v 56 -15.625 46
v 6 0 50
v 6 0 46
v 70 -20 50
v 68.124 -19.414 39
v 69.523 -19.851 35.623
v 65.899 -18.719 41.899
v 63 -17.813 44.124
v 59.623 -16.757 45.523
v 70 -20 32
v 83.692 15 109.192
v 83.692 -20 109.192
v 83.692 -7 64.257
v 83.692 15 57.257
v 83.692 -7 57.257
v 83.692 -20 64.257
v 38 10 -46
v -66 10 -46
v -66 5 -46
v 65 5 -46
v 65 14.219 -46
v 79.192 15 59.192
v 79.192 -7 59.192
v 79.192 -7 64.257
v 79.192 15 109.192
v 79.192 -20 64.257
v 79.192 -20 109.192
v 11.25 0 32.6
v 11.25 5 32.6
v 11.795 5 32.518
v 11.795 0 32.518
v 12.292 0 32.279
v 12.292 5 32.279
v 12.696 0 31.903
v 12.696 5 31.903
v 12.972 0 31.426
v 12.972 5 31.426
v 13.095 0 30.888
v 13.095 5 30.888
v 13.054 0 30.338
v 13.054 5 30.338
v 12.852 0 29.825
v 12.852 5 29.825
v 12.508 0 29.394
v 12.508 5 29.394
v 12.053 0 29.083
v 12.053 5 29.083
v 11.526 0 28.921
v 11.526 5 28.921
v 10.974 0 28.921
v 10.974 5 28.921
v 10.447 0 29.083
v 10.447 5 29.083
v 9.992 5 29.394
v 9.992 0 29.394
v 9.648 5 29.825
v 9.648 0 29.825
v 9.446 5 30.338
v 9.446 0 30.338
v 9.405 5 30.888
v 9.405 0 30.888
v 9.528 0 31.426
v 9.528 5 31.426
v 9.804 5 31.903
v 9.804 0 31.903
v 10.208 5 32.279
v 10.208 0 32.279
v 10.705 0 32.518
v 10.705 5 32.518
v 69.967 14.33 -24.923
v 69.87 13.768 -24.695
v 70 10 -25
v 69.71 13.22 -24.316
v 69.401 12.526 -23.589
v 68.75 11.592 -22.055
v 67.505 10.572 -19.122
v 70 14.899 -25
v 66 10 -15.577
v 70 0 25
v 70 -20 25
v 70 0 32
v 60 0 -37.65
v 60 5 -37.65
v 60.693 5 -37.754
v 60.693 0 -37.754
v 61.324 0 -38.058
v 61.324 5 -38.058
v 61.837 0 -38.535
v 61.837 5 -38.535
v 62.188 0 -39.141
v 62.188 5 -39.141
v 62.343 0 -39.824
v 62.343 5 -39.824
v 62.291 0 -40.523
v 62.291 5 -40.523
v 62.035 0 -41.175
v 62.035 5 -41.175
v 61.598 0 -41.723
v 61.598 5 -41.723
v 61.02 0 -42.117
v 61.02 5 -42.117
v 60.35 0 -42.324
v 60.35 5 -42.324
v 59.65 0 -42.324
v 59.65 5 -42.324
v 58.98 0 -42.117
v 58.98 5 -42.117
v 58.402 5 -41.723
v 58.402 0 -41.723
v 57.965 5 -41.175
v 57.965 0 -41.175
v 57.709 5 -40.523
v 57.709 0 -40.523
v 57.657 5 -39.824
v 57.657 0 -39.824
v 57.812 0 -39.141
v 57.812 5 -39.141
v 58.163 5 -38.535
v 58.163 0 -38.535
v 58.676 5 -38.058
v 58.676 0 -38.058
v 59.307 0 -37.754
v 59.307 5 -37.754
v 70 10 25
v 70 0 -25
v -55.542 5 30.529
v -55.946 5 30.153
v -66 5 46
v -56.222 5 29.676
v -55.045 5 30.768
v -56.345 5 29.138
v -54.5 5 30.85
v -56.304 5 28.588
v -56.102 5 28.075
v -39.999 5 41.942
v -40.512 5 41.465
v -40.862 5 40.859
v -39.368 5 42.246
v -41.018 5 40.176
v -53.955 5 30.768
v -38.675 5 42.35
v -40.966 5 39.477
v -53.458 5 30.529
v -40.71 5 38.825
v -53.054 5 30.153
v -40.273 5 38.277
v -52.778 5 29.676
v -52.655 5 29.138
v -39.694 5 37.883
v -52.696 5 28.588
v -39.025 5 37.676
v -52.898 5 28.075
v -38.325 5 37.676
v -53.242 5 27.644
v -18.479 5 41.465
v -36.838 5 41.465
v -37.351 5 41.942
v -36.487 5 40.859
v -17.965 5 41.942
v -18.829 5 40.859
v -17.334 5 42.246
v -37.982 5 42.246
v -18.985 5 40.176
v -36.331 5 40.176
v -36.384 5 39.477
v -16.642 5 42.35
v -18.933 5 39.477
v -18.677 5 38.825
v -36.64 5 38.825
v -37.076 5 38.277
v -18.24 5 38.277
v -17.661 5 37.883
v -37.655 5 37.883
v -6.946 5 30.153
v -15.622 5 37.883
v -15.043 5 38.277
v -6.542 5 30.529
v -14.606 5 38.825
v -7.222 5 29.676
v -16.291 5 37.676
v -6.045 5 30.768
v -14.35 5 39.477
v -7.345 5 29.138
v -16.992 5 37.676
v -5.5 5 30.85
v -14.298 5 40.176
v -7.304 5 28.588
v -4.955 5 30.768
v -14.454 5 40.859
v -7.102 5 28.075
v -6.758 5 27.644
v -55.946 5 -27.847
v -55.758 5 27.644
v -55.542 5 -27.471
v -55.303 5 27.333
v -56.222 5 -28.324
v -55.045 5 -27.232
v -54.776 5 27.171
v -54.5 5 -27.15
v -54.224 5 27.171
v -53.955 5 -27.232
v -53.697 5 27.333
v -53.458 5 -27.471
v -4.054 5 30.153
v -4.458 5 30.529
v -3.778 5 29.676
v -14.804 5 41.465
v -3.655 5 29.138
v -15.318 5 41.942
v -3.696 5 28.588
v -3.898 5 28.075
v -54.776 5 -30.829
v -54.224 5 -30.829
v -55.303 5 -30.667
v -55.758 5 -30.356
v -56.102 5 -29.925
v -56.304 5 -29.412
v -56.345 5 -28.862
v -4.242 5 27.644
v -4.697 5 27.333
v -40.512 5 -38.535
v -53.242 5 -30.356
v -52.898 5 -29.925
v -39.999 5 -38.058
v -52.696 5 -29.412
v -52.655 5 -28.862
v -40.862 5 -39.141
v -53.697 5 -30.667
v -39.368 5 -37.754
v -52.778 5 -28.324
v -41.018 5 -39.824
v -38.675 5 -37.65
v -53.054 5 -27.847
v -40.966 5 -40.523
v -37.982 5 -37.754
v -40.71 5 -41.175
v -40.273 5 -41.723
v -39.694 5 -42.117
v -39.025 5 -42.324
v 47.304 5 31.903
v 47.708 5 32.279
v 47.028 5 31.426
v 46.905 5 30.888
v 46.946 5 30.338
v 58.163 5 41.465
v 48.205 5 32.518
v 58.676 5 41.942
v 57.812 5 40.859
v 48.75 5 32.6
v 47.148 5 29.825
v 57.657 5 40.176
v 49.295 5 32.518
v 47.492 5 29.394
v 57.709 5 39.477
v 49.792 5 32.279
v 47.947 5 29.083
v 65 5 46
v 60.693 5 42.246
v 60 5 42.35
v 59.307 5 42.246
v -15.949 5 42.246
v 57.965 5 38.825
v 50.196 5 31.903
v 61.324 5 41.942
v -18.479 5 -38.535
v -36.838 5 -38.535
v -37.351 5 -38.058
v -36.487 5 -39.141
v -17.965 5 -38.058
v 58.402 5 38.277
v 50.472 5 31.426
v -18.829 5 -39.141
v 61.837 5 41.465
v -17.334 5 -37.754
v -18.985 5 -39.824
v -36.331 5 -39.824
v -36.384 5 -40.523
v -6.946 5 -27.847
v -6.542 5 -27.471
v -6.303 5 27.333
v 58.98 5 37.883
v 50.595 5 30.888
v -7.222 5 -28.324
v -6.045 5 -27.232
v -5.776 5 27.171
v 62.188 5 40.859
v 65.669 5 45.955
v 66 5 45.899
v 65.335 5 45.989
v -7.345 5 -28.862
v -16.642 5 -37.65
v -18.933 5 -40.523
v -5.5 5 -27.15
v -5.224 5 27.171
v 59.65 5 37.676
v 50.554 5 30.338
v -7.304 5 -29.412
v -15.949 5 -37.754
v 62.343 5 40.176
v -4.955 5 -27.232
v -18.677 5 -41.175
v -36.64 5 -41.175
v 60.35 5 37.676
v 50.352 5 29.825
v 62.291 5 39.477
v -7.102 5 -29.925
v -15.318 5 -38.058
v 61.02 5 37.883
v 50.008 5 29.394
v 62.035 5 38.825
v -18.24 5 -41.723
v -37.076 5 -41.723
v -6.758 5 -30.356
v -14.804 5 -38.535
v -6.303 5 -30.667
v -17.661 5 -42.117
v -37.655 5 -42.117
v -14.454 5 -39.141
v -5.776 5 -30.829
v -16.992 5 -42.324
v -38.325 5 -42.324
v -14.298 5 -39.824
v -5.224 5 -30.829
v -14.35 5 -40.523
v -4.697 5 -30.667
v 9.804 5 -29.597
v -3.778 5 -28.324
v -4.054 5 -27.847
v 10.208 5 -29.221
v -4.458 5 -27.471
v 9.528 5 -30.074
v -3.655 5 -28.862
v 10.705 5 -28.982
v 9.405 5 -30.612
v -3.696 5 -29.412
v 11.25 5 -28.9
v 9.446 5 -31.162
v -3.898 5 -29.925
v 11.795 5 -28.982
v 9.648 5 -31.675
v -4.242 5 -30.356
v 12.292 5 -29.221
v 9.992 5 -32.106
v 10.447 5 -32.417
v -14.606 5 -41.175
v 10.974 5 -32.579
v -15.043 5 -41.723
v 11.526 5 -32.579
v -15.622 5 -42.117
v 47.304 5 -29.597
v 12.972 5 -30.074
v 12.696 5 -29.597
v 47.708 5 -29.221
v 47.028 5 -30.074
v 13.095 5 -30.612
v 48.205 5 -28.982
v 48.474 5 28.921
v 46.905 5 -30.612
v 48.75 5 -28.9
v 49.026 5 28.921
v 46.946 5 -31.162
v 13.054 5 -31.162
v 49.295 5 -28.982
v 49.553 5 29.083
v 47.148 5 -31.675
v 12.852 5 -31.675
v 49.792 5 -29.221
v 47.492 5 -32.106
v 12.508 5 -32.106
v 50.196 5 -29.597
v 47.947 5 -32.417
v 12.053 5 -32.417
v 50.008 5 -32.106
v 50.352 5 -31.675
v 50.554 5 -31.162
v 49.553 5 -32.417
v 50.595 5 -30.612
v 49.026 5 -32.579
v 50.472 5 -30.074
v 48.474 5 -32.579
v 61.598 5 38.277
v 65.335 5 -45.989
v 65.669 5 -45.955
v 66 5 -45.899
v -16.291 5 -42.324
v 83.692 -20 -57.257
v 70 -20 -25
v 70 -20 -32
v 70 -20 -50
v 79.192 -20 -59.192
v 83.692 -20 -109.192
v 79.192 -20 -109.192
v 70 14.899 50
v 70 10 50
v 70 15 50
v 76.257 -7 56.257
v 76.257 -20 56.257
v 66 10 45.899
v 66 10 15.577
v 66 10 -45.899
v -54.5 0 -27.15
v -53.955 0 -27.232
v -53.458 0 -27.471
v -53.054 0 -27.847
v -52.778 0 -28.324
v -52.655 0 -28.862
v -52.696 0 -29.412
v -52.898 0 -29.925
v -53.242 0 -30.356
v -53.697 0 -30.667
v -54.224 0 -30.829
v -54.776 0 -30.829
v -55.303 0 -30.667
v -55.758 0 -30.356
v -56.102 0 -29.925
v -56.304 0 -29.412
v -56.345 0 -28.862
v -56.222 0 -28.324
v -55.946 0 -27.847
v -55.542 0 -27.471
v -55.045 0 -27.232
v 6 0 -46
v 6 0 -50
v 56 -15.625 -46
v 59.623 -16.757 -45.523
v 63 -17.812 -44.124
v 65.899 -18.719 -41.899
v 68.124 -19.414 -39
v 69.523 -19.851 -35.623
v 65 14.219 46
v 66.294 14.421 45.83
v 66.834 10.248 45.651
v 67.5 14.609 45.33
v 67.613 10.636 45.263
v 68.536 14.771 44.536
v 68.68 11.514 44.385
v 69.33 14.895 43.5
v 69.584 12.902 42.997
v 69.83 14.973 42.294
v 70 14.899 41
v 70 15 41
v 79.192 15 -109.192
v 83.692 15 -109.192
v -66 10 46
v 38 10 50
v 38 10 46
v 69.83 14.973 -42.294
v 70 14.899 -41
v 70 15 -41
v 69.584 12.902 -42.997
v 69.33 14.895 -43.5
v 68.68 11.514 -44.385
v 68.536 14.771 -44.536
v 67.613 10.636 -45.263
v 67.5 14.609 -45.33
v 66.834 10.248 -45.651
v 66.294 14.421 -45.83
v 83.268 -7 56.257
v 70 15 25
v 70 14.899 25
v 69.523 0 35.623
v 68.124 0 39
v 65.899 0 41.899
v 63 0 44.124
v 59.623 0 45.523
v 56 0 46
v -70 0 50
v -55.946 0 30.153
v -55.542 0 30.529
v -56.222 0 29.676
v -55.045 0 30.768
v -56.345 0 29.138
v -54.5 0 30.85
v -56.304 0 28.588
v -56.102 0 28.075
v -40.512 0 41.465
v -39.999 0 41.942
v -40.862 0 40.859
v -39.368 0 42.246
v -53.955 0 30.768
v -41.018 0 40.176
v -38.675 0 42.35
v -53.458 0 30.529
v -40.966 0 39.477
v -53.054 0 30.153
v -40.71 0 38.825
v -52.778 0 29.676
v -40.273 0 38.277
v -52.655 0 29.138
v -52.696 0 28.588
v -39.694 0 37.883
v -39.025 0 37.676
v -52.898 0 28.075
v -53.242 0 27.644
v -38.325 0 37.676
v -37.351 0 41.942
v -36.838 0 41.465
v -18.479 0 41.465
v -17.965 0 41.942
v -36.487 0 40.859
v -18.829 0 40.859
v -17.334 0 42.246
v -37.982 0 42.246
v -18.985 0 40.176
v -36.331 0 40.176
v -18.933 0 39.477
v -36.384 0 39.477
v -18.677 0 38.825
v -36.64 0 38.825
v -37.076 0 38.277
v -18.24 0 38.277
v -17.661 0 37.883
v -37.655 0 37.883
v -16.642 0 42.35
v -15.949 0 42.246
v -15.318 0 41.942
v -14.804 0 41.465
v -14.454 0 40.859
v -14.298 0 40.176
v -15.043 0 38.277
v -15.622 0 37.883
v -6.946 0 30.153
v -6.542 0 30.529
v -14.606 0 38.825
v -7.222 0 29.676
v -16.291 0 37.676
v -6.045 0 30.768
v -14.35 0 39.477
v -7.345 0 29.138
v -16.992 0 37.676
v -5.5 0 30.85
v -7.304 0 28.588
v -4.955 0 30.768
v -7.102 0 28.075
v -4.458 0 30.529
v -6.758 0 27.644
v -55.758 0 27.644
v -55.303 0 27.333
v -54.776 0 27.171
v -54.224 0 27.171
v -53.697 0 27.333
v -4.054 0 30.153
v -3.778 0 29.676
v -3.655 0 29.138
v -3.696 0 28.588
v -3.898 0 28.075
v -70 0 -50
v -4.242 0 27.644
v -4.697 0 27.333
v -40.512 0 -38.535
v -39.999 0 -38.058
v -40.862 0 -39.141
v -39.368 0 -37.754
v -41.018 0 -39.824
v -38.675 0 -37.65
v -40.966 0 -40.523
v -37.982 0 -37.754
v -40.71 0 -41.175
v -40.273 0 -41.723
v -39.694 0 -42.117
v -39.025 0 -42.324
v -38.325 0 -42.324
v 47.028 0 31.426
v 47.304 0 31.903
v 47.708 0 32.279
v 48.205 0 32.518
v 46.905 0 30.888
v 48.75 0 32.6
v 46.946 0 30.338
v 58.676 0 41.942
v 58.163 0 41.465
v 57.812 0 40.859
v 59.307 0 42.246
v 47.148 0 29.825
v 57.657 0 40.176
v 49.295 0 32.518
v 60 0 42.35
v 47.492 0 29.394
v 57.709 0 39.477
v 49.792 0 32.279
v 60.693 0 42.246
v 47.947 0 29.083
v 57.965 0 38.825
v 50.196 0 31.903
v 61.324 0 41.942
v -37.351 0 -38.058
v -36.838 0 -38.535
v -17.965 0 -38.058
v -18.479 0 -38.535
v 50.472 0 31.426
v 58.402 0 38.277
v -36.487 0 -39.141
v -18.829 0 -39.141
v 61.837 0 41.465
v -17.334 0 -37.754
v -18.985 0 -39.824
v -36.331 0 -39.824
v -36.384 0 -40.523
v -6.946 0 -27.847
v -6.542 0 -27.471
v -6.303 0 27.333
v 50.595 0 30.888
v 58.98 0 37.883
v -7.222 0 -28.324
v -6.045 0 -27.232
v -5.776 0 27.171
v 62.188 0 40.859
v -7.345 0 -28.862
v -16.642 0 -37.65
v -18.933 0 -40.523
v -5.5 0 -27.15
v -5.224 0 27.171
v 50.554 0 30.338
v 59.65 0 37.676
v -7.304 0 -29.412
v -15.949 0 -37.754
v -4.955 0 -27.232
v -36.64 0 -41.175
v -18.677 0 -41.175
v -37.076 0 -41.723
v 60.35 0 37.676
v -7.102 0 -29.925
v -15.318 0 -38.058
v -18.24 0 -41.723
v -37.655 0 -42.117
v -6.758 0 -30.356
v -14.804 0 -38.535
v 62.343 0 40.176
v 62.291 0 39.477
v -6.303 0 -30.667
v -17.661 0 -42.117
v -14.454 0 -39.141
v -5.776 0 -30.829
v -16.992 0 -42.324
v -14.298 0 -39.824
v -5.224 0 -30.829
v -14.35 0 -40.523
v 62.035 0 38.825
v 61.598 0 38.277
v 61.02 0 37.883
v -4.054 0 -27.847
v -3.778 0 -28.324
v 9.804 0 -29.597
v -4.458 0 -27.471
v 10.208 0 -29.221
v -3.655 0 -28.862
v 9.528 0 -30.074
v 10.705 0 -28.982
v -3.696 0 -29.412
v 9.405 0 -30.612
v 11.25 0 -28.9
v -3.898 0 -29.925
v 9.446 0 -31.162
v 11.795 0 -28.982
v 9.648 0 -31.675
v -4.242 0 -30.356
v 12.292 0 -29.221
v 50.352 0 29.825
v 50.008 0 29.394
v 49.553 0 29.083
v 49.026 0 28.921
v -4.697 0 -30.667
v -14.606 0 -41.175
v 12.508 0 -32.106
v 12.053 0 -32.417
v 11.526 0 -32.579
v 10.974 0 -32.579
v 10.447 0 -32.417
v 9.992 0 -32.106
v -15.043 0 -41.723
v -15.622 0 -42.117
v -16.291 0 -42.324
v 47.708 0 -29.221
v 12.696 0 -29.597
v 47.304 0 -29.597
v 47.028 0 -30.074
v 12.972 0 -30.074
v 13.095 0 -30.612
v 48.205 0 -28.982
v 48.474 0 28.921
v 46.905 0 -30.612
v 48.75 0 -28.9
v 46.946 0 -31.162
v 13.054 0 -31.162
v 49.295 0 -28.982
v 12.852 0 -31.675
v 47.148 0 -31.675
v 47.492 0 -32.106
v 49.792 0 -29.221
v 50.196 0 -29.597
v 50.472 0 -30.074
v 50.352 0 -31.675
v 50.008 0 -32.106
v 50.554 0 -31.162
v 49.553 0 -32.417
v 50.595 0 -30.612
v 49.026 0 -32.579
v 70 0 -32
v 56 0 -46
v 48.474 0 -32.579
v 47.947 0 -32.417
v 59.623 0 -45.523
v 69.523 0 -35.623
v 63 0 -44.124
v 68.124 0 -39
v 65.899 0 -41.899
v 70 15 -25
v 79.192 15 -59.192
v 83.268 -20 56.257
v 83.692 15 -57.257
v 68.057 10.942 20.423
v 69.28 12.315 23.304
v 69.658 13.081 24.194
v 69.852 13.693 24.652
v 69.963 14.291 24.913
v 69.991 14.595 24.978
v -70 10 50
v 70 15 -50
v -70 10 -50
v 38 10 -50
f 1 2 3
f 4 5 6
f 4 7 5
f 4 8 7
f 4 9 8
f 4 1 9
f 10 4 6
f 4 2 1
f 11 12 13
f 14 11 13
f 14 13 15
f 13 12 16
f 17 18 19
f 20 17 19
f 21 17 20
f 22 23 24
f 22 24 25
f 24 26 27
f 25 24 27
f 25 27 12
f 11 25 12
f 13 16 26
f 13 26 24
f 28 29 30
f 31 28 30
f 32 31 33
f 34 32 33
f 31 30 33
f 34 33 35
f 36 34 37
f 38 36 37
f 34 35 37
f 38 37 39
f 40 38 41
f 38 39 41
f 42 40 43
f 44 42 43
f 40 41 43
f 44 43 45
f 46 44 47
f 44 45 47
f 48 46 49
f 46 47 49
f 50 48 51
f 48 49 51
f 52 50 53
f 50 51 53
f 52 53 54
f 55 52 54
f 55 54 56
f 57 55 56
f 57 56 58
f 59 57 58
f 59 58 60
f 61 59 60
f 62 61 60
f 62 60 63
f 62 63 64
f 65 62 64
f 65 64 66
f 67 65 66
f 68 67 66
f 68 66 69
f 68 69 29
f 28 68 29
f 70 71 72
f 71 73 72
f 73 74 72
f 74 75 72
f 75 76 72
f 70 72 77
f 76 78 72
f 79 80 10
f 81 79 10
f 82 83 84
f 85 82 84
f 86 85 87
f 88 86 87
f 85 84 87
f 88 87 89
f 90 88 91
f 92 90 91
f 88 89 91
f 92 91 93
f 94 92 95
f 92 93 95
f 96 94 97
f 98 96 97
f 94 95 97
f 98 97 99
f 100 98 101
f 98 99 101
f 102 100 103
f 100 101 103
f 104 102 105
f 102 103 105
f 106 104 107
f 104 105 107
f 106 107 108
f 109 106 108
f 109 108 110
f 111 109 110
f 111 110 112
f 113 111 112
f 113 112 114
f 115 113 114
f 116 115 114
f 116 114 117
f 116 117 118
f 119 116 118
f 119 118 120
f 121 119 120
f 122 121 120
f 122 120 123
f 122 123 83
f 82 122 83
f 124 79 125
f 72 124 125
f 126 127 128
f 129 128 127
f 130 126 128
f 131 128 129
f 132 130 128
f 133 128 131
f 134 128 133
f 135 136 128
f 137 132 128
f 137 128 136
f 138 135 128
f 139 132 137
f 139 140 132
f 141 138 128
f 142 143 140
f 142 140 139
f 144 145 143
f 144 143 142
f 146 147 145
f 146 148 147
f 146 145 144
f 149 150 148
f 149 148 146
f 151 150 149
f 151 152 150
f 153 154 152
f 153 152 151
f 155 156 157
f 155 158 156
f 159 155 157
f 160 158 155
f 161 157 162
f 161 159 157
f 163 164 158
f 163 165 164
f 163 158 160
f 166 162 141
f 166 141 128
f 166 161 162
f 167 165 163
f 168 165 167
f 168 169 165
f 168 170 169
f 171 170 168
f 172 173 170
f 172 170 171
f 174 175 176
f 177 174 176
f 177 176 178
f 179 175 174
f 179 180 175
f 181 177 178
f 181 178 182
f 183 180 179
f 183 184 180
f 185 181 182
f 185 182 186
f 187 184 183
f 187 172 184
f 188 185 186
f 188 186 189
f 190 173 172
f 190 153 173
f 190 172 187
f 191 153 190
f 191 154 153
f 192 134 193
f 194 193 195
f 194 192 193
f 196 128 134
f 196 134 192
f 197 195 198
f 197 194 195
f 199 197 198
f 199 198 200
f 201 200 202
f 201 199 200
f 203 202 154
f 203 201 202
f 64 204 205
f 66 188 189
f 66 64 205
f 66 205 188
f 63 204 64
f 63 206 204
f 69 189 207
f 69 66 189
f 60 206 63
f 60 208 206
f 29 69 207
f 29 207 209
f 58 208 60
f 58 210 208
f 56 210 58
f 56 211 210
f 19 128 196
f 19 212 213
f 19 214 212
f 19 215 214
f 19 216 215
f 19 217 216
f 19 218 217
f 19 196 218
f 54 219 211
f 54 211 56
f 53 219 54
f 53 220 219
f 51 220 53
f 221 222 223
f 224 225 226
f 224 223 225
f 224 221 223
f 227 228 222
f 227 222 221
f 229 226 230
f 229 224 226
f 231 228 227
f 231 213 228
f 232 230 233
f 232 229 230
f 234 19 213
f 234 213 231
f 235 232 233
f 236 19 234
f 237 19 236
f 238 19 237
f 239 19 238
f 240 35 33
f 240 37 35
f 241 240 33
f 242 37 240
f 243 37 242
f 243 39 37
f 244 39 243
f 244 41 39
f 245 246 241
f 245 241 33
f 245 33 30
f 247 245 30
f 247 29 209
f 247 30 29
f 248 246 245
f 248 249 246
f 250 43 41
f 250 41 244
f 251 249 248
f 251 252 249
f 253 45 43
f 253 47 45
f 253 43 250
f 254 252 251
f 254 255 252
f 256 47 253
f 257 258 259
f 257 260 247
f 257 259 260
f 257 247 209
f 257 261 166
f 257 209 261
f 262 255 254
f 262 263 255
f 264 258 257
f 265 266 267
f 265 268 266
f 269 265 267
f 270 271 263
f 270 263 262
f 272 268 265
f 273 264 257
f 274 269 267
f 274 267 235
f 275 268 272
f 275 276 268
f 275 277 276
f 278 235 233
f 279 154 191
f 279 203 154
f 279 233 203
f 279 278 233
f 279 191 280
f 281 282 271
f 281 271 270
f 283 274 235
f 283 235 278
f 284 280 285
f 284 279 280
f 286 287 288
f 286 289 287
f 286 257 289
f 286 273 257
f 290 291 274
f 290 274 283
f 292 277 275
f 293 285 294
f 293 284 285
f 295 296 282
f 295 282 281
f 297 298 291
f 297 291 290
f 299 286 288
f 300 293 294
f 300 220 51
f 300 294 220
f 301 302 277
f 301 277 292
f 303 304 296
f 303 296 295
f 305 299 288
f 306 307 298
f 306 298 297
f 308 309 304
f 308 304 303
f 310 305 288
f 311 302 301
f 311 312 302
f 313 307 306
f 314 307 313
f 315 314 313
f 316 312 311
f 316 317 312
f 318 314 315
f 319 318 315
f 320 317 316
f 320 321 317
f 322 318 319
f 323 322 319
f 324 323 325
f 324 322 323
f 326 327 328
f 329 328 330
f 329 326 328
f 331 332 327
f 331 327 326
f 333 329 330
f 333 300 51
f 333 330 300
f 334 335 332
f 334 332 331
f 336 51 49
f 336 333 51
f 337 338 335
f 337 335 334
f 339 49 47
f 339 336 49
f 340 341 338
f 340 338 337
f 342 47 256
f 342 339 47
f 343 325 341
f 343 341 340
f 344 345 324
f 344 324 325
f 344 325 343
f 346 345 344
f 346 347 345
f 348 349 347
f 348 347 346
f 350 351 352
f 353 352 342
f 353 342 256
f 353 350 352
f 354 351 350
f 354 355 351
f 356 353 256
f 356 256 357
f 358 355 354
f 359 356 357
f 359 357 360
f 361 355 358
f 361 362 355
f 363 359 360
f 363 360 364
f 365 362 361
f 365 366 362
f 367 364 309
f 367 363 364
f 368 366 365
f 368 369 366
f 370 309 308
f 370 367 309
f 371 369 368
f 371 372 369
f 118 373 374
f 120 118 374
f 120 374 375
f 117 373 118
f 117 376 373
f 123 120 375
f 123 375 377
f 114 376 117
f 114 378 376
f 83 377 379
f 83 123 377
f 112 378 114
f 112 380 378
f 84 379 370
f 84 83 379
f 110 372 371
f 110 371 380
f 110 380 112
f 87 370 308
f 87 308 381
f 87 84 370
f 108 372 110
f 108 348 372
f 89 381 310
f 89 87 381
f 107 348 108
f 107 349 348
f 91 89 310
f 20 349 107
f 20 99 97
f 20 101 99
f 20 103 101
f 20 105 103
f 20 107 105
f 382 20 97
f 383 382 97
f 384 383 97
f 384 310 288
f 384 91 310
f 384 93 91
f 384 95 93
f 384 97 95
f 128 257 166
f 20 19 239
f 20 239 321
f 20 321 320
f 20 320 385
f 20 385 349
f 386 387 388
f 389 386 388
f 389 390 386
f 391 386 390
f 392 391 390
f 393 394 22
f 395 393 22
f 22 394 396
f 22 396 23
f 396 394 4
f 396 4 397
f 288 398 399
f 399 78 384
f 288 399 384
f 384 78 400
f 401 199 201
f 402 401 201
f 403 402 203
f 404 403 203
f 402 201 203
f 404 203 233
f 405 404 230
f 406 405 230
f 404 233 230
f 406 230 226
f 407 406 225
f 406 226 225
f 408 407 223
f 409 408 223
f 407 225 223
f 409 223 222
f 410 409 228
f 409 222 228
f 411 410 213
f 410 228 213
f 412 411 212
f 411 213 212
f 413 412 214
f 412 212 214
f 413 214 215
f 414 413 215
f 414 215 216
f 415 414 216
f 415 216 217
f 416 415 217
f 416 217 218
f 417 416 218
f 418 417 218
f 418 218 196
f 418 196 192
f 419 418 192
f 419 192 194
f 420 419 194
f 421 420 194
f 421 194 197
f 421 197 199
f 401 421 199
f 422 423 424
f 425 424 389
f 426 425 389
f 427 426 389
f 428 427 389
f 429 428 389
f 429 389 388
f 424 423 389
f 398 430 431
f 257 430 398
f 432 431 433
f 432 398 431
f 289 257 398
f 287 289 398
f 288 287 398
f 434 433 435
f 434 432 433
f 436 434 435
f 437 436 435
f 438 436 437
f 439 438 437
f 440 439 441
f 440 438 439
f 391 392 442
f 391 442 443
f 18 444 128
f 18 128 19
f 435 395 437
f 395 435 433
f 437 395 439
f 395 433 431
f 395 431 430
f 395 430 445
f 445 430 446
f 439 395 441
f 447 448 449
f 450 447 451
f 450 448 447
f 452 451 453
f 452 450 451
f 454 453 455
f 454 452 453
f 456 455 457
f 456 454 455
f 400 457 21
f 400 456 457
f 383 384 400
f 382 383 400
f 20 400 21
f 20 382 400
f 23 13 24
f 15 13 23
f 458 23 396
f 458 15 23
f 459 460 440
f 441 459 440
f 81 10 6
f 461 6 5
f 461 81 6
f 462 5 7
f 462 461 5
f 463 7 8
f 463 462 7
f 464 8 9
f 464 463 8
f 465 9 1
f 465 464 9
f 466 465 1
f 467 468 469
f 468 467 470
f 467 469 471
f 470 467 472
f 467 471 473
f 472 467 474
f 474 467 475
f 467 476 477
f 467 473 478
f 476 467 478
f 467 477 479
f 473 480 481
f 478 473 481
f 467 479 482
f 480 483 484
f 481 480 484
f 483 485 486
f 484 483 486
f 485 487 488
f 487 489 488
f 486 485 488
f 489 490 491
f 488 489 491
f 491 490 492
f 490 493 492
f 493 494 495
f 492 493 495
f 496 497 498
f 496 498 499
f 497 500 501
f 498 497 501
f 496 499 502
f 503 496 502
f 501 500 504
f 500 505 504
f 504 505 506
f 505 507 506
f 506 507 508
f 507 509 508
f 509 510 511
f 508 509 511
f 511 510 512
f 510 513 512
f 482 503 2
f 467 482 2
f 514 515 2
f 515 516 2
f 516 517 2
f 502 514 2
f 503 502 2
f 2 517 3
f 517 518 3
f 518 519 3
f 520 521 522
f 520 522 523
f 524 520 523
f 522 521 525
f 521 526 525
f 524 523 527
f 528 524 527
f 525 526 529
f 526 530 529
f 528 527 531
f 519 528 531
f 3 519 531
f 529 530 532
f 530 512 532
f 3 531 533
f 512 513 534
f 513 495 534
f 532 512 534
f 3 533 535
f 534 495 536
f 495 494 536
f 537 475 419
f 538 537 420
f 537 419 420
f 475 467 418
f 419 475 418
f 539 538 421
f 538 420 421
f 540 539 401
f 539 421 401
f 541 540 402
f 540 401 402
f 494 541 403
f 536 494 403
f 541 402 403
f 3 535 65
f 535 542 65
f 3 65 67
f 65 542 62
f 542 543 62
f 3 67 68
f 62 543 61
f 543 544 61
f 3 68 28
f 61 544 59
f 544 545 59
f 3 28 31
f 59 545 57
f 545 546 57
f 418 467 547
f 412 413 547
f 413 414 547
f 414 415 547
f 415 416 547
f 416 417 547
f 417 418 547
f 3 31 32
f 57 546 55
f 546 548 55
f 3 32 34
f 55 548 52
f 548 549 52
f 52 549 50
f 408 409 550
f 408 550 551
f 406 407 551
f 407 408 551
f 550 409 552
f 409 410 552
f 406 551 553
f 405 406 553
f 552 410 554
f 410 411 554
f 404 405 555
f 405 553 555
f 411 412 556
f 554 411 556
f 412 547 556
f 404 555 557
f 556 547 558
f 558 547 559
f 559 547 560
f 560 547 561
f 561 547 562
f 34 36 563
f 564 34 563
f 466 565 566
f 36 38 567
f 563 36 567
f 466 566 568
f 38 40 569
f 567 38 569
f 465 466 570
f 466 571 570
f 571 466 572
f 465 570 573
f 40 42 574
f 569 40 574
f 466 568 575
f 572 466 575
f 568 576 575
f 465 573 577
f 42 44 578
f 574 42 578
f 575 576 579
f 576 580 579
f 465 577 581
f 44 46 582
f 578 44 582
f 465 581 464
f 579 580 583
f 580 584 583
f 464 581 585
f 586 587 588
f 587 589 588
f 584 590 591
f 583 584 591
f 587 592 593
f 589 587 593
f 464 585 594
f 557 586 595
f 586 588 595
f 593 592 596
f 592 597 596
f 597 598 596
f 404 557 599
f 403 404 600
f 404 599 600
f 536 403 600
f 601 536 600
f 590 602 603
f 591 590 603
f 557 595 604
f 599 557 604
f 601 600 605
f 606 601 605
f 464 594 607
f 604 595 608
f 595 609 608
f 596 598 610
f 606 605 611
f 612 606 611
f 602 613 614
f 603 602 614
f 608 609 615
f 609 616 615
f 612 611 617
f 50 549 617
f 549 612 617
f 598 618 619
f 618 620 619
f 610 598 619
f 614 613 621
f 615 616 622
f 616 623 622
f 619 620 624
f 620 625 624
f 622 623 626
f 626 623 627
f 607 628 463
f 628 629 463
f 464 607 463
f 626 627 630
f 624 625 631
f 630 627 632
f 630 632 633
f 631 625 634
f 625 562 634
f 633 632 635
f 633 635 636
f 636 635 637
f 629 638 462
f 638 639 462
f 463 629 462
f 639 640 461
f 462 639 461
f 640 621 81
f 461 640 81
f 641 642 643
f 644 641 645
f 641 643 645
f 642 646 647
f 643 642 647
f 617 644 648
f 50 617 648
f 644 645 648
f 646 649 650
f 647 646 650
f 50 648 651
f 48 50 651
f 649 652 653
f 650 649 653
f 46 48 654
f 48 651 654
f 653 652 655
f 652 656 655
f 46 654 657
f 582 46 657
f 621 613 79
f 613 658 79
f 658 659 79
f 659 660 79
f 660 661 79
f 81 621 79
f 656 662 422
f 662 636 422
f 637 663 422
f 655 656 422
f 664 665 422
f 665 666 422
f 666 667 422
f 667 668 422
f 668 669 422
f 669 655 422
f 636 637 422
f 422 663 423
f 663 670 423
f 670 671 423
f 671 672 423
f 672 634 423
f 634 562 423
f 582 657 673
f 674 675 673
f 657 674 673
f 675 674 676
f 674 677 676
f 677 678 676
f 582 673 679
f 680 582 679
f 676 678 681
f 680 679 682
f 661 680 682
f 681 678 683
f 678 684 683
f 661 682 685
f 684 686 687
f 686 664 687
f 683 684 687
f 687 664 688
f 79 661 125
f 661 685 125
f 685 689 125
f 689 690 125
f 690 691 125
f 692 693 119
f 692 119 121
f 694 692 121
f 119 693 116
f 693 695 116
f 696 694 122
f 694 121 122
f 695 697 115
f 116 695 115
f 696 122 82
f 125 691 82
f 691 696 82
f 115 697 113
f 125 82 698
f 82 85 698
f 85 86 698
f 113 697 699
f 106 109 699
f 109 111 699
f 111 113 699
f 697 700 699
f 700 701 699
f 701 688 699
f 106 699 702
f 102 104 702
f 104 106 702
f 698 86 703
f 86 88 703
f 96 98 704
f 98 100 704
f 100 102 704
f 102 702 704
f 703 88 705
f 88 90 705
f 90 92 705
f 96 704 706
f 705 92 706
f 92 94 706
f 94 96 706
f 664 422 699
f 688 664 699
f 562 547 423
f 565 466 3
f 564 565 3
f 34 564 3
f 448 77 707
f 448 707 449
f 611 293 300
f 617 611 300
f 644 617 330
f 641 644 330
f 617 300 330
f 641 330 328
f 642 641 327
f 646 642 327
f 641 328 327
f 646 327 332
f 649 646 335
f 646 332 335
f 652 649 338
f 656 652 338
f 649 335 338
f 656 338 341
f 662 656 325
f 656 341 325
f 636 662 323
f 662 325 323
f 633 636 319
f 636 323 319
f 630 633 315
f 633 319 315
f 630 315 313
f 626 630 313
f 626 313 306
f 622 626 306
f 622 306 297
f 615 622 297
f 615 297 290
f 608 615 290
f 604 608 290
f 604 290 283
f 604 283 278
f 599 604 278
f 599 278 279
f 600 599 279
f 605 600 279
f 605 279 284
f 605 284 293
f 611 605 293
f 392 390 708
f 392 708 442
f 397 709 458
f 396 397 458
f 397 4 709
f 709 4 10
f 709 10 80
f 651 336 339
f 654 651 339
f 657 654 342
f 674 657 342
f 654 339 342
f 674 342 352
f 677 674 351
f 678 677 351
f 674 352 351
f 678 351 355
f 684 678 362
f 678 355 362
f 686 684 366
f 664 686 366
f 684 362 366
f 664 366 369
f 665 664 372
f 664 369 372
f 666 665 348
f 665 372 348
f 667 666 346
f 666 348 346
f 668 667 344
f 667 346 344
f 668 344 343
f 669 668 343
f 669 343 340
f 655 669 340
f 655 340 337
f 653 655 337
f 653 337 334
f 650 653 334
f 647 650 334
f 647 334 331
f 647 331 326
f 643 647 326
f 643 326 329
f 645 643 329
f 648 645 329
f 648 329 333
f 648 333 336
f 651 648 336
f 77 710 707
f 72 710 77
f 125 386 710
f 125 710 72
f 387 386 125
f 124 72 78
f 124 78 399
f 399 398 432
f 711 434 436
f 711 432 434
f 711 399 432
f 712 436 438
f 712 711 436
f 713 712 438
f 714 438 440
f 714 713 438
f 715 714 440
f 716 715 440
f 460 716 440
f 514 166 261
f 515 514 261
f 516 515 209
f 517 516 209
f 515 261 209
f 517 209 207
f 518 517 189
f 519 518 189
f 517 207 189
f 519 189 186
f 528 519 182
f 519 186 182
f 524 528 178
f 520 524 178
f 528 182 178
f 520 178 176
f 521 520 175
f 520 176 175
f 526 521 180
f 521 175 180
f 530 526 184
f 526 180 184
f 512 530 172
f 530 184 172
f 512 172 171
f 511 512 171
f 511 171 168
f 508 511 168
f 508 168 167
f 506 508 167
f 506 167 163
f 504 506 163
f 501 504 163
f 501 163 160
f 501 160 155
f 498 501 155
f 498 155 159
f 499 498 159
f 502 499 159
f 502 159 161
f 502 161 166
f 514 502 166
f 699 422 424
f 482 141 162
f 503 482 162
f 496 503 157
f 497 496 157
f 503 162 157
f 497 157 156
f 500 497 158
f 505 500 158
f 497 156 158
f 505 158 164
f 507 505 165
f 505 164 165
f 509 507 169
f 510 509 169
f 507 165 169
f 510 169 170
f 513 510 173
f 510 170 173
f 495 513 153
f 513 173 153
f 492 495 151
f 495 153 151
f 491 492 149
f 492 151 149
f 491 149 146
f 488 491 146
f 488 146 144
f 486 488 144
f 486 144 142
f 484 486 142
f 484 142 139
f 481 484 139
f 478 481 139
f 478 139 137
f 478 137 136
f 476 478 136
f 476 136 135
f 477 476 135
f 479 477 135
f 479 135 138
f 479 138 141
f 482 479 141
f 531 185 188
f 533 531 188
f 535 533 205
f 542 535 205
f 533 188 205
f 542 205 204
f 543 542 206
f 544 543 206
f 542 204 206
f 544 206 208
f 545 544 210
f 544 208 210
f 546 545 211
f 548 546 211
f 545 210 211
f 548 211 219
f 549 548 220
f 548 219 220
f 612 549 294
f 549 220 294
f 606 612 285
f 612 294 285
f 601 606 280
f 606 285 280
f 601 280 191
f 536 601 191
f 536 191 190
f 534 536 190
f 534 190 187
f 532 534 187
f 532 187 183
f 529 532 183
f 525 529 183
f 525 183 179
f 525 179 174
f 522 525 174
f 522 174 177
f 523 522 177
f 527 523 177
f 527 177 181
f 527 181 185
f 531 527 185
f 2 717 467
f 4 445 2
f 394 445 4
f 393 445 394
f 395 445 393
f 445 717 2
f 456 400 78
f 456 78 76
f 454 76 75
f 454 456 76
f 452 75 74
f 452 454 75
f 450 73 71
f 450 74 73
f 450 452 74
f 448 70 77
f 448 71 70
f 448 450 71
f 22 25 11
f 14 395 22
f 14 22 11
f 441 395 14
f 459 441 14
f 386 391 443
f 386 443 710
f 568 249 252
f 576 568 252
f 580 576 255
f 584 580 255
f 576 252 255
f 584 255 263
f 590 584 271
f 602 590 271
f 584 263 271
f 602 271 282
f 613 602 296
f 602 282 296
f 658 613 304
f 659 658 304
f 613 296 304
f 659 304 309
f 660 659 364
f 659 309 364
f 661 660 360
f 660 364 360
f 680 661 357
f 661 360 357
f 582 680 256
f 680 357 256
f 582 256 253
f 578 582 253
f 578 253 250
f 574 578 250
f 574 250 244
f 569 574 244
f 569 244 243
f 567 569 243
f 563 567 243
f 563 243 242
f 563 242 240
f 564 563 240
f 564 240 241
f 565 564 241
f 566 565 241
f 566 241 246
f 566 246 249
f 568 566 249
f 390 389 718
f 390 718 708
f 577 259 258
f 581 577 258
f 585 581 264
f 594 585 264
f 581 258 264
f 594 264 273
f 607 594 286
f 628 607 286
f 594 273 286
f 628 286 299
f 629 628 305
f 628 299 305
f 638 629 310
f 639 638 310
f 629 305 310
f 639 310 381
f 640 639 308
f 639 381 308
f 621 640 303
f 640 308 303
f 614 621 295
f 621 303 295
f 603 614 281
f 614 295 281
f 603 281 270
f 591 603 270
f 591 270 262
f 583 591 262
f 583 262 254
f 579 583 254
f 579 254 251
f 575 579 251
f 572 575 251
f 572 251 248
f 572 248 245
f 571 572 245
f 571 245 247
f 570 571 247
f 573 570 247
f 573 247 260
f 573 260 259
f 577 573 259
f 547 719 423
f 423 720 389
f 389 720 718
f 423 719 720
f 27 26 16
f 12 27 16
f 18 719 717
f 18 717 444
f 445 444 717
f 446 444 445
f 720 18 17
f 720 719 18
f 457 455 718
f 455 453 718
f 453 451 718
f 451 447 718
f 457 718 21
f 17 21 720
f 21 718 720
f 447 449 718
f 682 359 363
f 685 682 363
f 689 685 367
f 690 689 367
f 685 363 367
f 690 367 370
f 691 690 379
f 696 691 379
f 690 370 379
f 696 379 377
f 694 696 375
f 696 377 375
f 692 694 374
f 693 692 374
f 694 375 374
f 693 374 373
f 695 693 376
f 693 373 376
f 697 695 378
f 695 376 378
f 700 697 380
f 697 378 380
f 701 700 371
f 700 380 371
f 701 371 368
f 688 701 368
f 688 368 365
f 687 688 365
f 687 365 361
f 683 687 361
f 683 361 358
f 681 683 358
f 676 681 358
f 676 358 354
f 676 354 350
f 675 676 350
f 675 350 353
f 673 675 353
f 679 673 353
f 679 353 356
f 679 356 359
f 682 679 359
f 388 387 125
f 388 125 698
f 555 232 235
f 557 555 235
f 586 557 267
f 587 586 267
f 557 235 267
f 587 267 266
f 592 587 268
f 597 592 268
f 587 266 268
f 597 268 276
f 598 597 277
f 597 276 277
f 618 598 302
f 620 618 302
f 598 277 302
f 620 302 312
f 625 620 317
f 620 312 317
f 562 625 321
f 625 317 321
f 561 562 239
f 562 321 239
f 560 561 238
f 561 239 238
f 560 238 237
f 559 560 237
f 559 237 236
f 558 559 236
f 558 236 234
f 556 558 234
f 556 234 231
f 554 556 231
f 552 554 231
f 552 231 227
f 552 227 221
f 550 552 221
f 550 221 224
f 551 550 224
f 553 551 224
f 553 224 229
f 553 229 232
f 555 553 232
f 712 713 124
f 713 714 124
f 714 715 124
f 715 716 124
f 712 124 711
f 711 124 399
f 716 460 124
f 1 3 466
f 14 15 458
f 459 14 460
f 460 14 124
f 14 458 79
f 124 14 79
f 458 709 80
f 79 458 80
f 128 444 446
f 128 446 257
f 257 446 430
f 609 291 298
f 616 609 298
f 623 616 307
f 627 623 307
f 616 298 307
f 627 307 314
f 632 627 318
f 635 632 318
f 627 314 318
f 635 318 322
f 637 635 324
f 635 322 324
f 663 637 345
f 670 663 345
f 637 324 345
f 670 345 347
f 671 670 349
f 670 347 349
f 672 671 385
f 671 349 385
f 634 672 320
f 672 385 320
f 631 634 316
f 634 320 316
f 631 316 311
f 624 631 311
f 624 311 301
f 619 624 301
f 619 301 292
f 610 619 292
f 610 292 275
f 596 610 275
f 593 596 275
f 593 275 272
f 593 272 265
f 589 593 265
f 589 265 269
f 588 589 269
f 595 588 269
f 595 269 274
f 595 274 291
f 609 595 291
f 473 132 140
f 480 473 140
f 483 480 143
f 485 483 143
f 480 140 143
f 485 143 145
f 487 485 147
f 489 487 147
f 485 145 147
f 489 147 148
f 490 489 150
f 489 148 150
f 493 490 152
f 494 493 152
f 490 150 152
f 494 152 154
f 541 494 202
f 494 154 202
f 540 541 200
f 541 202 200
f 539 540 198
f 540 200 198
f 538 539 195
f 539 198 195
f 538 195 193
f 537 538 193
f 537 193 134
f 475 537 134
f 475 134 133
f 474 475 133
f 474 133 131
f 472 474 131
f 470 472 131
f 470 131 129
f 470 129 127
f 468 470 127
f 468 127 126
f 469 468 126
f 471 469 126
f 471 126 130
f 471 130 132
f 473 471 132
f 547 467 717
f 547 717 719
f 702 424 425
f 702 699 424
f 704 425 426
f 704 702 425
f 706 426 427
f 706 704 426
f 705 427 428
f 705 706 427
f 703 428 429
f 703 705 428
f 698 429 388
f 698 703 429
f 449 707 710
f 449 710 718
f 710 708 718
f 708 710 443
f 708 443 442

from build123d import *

# Parameters (mm, degrees)
SKETCH1_W                = 140
SKETCH1_H                = 100
BOSS_EXTRUDE1_DEPTH      = 10
SKETCH2_W                = 132
SKETCH2_H                = 92
CUT_EXTRUDE1_DEPTH       = 5
CUT_EXTRUDE2_REACH       = 88.168
SKETCH6_R                = 2.35
CUT_EXTRUDE3_REACH       = 88.168
SKETCH9_R                = 1.85
BOSS_EXTRUDE2_DEPTH      = 15
BOSS_EXTRUDE2_DEPTH_BACK = 20
BOSS_EXTRUDE3_DEPTH      = 4
FILLET3_R                = 5
FILLET4_R                = 5
FILLET5_R                = 5
FILLET6_R                = 5
FILLET7_R                = 14
CUT_EXTRUDE4_REACH       = 191.59
SKETCH13_W               = 8
SKETCH13_H               = 13


with BuildPart() as part:
    # Sketch1 → Boss-Extrude1 (new body)
    with BuildSketch(Plane(origin=(0, 0, 0), x_dir=(1, 0, 0), z_dir=(0, 1, 0))):
        Rectangle(SKETCH1_W, SKETCH1_H)
    extrude(amount=BOSS_EXTRUDE1_DEPTH)

    # Sketch2 → Cut-Extrude1 (cut)
    with BuildSketch(Plane(origin=(0, 10, 0), x_dir=(1, 0, 0), z_dir=(0, 1, 0))):
        Rectangle(SKETCH2_W, SKETCH2_H)
    extrude(amount=-CUT_EXTRUDE1_DEPTH, mode=Mode.SUBTRACT)

    # Sketch6 → Cut-Extrude2 (cut, up to next)
    with BuildSketch(Plane(origin=(0, 5, 0), x_dir=(1, 0, 0), z_dir=(0, 1, 0)), mode=Mode.PRIVATE) as cut_extrude2_sk1:
        with Locations(Location((60, 40, 0), (0, 0, 270))):
            Circle(SKETCH6_R)
    cut_extrude2_tool1 = extrude(cut_extrude2_sk1.sketch, amount=-CUT_EXTRUDE2_REACH, mode=Mode.PRIVATE) & part.part
    # Sketch6 → Cut-Extrude2 (cut, up to next)
    with BuildSketch(Plane(origin=(0, 5, 0), x_dir=(1, 0, 0), z_dir=(0, 1, 0)), mode=Mode.PRIVATE) as cut_extrude2_sk2:
        with Locations(Location((60, -40, 0), (0, 0, 270))):
            Circle(SKETCH6_R)
    cut_extrude2_tool2 = extrude(cut_extrude2_sk2.sketch, amount=-CUT_EXTRUDE2_REACH, mode=Mode.PRIVATE) & part.part
    # Sketch6 → Cut-Extrude2 (cut, up to next)
    with BuildSketch(Plane(origin=(0, 5, 0), x_dir=(1, 0, 0), z_dir=(0, 1, 0)), mode=Mode.PRIVATE) as cut_extrude2_sk3:
        with Locations(Location((-16.641543992, -40, 0), (0, 0, 270))):
            Circle(SKETCH6_R)
    cut_extrude2_tool3 = extrude(cut_extrude2_sk3.sketch, amount=-CUT_EXTRUDE2_REACH, mode=Mode.PRIVATE) & part.part
    # Sketch6 → Cut-Extrude2 (cut, up to next)
    with BuildSketch(Plane(origin=(0, 5, 0), x_dir=(1, 0, 0), z_dir=(0, 1, 0)), mode=Mode.PRIVATE) as cut_extrude2_sk4:
        with Locations(Location((-16.641543992, 40, 0), (0, 0, 270))):
            Circle(SKETCH6_R)
    cut_extrude2_tool4 = extrude(cut_extrude2_sk4.sketch, amount=-CUT_EXTRUDE2_REACH, mode=Mode.PRIVATE) & part.part
    # Sketch6 → Cut-Extrude2 (cut, up to next)
    with BuildSketch(Plane(origin=(0, 5, 0), x_dir=(1, 0, 0), z_dir=(0, 1, 0)), mode=Mode.PRIVATE) as cut_extrude2_sk5:
        with Locations(Location((-38.674837349, -40, 0), (0, 0, 270))):
            Circle(SKETCH6_R)
    cut_extrude2_tool5 = extrude(cut_extrude2_sk5.sketch, amount=-CUT_EXTRUDE2_REACH, mode=Mode.PRIVATE) & part.part
    # Sketch6 → Cut-Extrude2 (cut, up to next)
    with BuildSketch(Plane(origin=(0, 5, 0), x_dir=(1, 0, 0), z_dir=(0, 1, 0)), mode=Mode.PRIVATE) as cut_extrude2_sk6:
        with Locations(Location((-38.674837349, 40, 0), (0, 0, 270))):
            Circle(SKETCH6_R)
    cut_extrude2_tool6 = extrude(cut_extrude2_sk6.sketch, amount=-CUT_EXTRUDE2_REACH, mode=Mode.PRIVATE) & part.part
    add(cut_extrude2_tool1.solids().sort_by_distance((60, 5, -40))[0], mode=Mode.SUBTRACT)
    add(cut_extrude2_tool2.solids().sort_by_distance((60, 5, 40))[0], mode=Mode.SUBTRACT)
    add(cut_extrude2_tool3.solids().sort_by_distance((-16.641544, 5, 40))[0], mode=Mode.SUBTRACT)
    add(cut_extrude2_tool4.solids().sort_by_distance((-16.641544, 5, -40))[0], mode=Mode.SUBTRACT)
    add(cut_extrude2_tool5.solids().sort_by_distance((-38.674837, 5, 40))[0], mode=Mode.SUBTRACT)
    add(cut_extrude2_tool6.solids().sort_by_distance((-38.674837, 5, -40))[0], mode=Mode.SUBTRACT)

    # Sketch9 → Cut-Extrude3 (cut, up to next)
    with BuildSketch(Plane(origin=(0, 5, 0), x_dir=(1, 0, 0), z_dir=(0, 1, 0)), mode=Mode.PRIVATE) as cut_extrude3_sk1:
        with Locations(Location((-54.5, 29, 0), (0, 0, 270))):
            Circle(SKETCH9_R)
    cut_extrude3_tool1 = extrude(cut_extrude3_sk1.sketch, amount=-CUT_EXTRUDE3_REACH, mode=Mode.PRIVATE) & part.part
    # Sketch9 → Cut-Extrude3 (cut, up to next)
    with BuildSketch(Plane(origin=(0, 5, 0), x_dir=(1, 0, 0), z_dir=(0, 1, 0)), mode=Mode.PRIVATE) as cut_extrude3_sk2:
        with Locations(Location((-5.5, 29, 0), (0, 0, 270))):
            Circle(SKETCH9_R)
    cut_extrude3_tool2 = extrude(cut_extrude3_sk2.sketch, amount=-CUT_EXTRUDE3_REACH, mode=Mode.PRIVATE) & part.part
    # Sketch9 → Cut-Extrude3 (cut, up to next)
    with BuildSketch(Plane(origin=(0, 5, 0), x_dir=(1, 0, 0), z_dir=(0, 1, 0)), mode=Mode.PRIVATE) as cut_extrude3_sk3:
        with Locations(Location((-54.5, -29, 0), (0, 0, 270))):
            Circle(SKETCH9_R)
    cut_extrude3_tool3 = extrude(cut_extrude3_sk3.sketch, amount=-CUT_EXTRUDE3_REACH, mode=Mode.PRIVATE) & part.part
    # Sketch9 → Cut-Extrude3 (cut, up to next)
    with BuildSketch(Plane(origin=(0, 5, 0), x_dir=(1, 0, 0), z_dir=(0, 1, 0)), mode=Mode.PRIVATE) as cut_extrude3_sk4:
        with Locations(Location((-5.5, -29, 0), (0, 0, 270))):
            Circle(SKETCH9_R)
    cut_extrude3_tool4 = extrude(cut_extrude3_sk4.sketch, amount=-CUT_EXTRUDE3_REACH, mode=Mode.PRIVATE) & part.part
    # Sketch9 → Cut-Extrude3 (cut, up to next)
    with BuildSketch(Plane(origin=(0, 5, 0), x_dir=(1, 0, 0), z_dir=(0, 1, 0)), mode=Mode.PRIVATE) as cut_extrude3_sk5:
        with Locations(Location((11.25, 30.75, 0), (0, 0, 270))):
            Circle(SKETCH9_R)
    cut_extrude3_tool5 = extrude(cut_extrude3_sk5.sketch, amount=-CUT_EXTRUDE3_REACH, mode=Mode.PRIVATE) & part.part
    # Sketch9 → Cut-Extrude3 (cut, up to next)
    with BuildSketch(Plane(origin=(0, 5, 0), x_dir=(1, 0, 0), z_dir=(0, 1, 0)), mode=Mode.PRIVATE) as cut_extrude3_sk6:
        with Locations(Location((48.75, 30.75, 0), (0, 0, 270))):
            Circle(SKETCH9_R)
    cut_extrude3_tool6 = extrude(cut_extrude3_sk6.sketch, amount=-CUT_EXTRUDE3_REACH, mode=Mode.PRIVATE) & part.part
    # Sketch9 → Cut-Extrude3 (cut, up to next)
    with BuildSketch(Plane(origin=(0, 5, 0), x_dir=(1, 0, 0), z_dir=(0, 1, 0)), mode=Mode.PRIVATE) as cut_extrude3_sk7:
        with Locations(Location((48.75, -30.75, 0), (0, 0, 270))):
            Circle(SKETCH9_R)
    cut_extrude3_tool7 = extrude(cut_extrude3_sk7.sketch, amount=-CUT_EXTRUDE3_REACH, mode=Mode.PRIVATE) & part.part
    # Sketch9 → Cut-Extrude3 (cut, up to next)
    with BuildSketch(Plane(origin=(0, 5, 0), x_dir=(1, 0, 0), z_dir=(0, 1, 0)), mode=Mode.PRIVATE) as cut_extrude3_sk8:
        with Locations(Location((11.25, -30.75, 0), (0, 0, 270))):
            Circle(SKETCH9_R)
    cut_extrude3_tool8 = extrude(cut_extrude3_sk8.sketch, amount=-CUT_EXTRUDE3_REACH, mode=Mode.PRIVATE) & part.part
    add(cut_extrude3_tool1.solids().sort_by_distance((-54.5, 5, -29))[0], mode=Mode.SUBTRACT)
    add(cut_extrude3_tool2.solids().sort_by_distance((-5.5, 5, -29))[0], mode=Mode.SUBTRACT)
    add(cut_extrude3_tool3.solids().sort_by_distance((-54.5, 5, 29))[0], mode=Mode.SUBTRACT)
    add(cut_extrude3_tool4.solids().sort_by_distance((-5.5, 5, 29))[0], mode=Mode.SUBTRACT)
    add(cut_extrude3_tool5.solids().sort_by_distance((11.25, 5, -30.75))[0], mode=Mode.SUBTRACT)
    add(cut_extrude3_tool6.solids().sort_by_distance((48.75, 5, -30.75))[0], mode=Mode.SUBTRACT)
    add(cut_extrude3_tool7.solids().sort_by_distance((48.75, 5, 30.75))[0], mode=Mode.SUBTRACT)
    add(cut_extrude3_tool8.solids().sort_by_distance((11.25, 5, 30.75))[0], mode=Mode.SUBTRACT)

    # Sketch11 → Boss-Extrude2 (add, two sides: drawn at the far end of the back side and taken through both)
    with BuildSketch(Plane(origin=(0, 0, 0), x_dir=(1, 0, 0), z_dir=(0, 1, 0)).offset(-BOSS_EXTRUDE2_DEPTH_BACK)):
        Polygon((70, 50), (79.192388155, 59.192388155), (79.192388155, 109.192388155), (83.692388155, 109.192388155), (83.692388155, 57.25724503), (70, 25), align=None)
        Polygon((70, -25), (70, -50), (79.192388155, -59.192388155), (79.192388155, -109.192388155), (83.692388155, -109.192388155), (83.692388155, -57.25724503), align=None)
    extrude(amount=BOSS_EXTRUDE2_DEPTH + BOSS_EXTRUDE2_DEPTH_BACK)

    # Sketch12 → Boss-Extrude3 (add)
    with BuildSketch(Plane(origin=(0, 0, -50), x_dir=(-1, 0, 0), z_dir=(0, 0, -1))):
        Polygon((-70, 15), (-38, 10), (-70, 10), align=None)
        Polygon((-70, -20), (-70, 0), (-6, 0), align=None)
    boss_extrude3 = extrude(amount=-BOSS_EXTRUDE3_DEPTH)

    # Fillet3
    # the kernel refuses this fillet: 5 mm, written as the material it adds along each edge
    with BuildSketch(Plane(origin=(70, 10, -58.247448714), x_dir=(0, 1, 0), z_dir=(0, 0, 1))) as fillet3_piece_1_section:
        with BuildLine():
            CenterArc((4.898979486, 5), FILLET3_R, 191.536959033, 78.463040967)
            Line((0, 4), (0, 0))
            Line((0, 0), (4.898979486, 0))
        make_face()
    fillet3_piece_1 = extrude(amount=45.494897428, mode=Mode.PRIVATE)
    fillet3_piece_1 = split(fillet3_piece_1, bisect_by=Plane(origin=(81.95810656, 10, -53.17153363), z_dir=(-0.9205048534524429, 0, -0.3907311284892677)), keep=Keep.TOP, mode=Mode.PRIVATE)
    fillet3_piece_1 = split(fillet3_piece_1, bisect_by=Plane(origin=(74.123724357, 10, -54.123724357), z_dir=(0.7071067811865478, 0, 0.7071067811865472)), keep=Keep.TOP, mode=Mode.PRIVATE)
    add(fillet3_piece_1)

    # Fillet4
    # the kernel refuses this fillet: 5 mm, written as the material it adds along each edge
    with BuildSketch(Plane(origin=(70, 2.398979486, -46), x_dir=(0, 0, 1), z_dir=(0, 1, 0))) as fillet4_piece_1_section:
        with BuildLine():
            CenterArc((FILLET4_R, -FILLET4_R), FILLET4_R, 90, 90)
            Line((0, -FILLET4_R), (0, 0))
            Line((0, 0), (FILLET4_R, 0))
        make_face()
    fillet4_piece_1 = extrude(amount=25.101020514, mode=Mode.PRIVATE)
    fillet4_piece_1 = split(fillet4_piece_1, bisect_by=Plane(origin=(68.07801403, 14.699689692, -46), z_dir=(0.15437688027360966, -0.9880120337511015, 0)), keep=Keep.TOP, mode=Mode.PRIVATE)
    add(fillet4_piece_1)

    # Mirror6: Boss-Extrude3 across plane
    add(boss_extrude3.mirror(Plane.XY))

    # Fillet5
    # the kernel refuses this fillet: 5 mm, written as the material it adds along each edge
    with BuildSketch(Plane(origin=(70, 10, 12.752551286), x_dir=(-1.0, 1.5649703755111202e-12, 0), z_dir=(0, 0, 1))) as fillet5_piece_1_section:
        with BuildLine():
            CenterArc((5, -4.898979486), FILLET5_R, 101.536959033, 78.463040967)
            Line((0, -4.898979486), (0, 0))
            Line((0, 0), (4, 0))
        make_face()
    fillet5_piece_1 = extrude(amount=45.494897428, mode=Mode.PRIVATE)
    fillet5_piece_1 = split(fillet5_piece_1, bisect_by=Plane(origin=(51.376275643, 10, 31.376275643), z_dir=(0.7071067811865478, 0, -0.7071067811865472)), keep=Keep.TOP, mode=Mode.PRIVATE)
    fillet5_piece_1 = split(fillet5_piece_1, bisect_by=Plane(origin=(65.594961344, 10, 14.62237926), z_dir=(-0.9205048534524429, 0, 0.3907311284892677)), keep=Keep.TOP, mode=Mode.PRIVATE)
    add(fillet5_piece_1)

    # Fillet6
    # the kernel refuses this fillet: 5 mm, written as the material it adds along each edge
    with BuildSketch(Plane(origin=(70, 2.398979486, 46), x_dir=(-1, 0, 0), z_dir=(0, 1, 0))) as fillet6_piece_1_section:
        with BuildLine():
            CenterArc((FILLET6_R, -FILLET6_R), FILLET6_R, 90, 90)
            Line((0, -FILLET6_R), (0, 0))
            Line((0, 0), (FILLET6_R, 0))
        make_face()
    fillet6_piece_1 = extrude(amount=25.101020514, mode=Mode.PRIVATE)
    fillet6_piece_1 = split(fillet6_piece_1, bisect_by=Plane(origin=(68.07801403, 14.699689692, 46), z_dir=(0.15437688027360966, -0.9880120337511015, 0)), keep=Keep.TOP, mode=Mode.PRIVATE)
    add(fillet6_piece_1)

    # Fillet7
    fillet7_edges = [part.edges().sort_by_distance(p)[0] for p in [
        (70, -10, -46),
        (70, -10, 46),
    ]]
    fillet(fillet7_edges, radius=FILLET7_R)

    # Sketch13 → Cut-Extrude4 (cut, up to next)
    with BuildSketch(Plane(origin=(83.692388155, 0, 0), x_dir=(0, 0, -1), z_dir=(1, 0, 0)), mode=Mode.PRIVATE) as cut_extrude4_sk1:
        with Locations((-60.25724503, -13.5)):
            Rectangle(SKETCH13_W, SKETCH13_H)
    cut_extrude4_tool1 = extrude(cut_extrude4_sk1.sketch, amount=-CUT_EXTRUDE4_REACH, mode=Mode.PRIVATE) & part.part
    add(cut_extrude4_tool1.solids().sort_by_distance((83.692388, -13.5, 60.257245))[0], mode=Mode.SUBTRACT)


solid = part.part
